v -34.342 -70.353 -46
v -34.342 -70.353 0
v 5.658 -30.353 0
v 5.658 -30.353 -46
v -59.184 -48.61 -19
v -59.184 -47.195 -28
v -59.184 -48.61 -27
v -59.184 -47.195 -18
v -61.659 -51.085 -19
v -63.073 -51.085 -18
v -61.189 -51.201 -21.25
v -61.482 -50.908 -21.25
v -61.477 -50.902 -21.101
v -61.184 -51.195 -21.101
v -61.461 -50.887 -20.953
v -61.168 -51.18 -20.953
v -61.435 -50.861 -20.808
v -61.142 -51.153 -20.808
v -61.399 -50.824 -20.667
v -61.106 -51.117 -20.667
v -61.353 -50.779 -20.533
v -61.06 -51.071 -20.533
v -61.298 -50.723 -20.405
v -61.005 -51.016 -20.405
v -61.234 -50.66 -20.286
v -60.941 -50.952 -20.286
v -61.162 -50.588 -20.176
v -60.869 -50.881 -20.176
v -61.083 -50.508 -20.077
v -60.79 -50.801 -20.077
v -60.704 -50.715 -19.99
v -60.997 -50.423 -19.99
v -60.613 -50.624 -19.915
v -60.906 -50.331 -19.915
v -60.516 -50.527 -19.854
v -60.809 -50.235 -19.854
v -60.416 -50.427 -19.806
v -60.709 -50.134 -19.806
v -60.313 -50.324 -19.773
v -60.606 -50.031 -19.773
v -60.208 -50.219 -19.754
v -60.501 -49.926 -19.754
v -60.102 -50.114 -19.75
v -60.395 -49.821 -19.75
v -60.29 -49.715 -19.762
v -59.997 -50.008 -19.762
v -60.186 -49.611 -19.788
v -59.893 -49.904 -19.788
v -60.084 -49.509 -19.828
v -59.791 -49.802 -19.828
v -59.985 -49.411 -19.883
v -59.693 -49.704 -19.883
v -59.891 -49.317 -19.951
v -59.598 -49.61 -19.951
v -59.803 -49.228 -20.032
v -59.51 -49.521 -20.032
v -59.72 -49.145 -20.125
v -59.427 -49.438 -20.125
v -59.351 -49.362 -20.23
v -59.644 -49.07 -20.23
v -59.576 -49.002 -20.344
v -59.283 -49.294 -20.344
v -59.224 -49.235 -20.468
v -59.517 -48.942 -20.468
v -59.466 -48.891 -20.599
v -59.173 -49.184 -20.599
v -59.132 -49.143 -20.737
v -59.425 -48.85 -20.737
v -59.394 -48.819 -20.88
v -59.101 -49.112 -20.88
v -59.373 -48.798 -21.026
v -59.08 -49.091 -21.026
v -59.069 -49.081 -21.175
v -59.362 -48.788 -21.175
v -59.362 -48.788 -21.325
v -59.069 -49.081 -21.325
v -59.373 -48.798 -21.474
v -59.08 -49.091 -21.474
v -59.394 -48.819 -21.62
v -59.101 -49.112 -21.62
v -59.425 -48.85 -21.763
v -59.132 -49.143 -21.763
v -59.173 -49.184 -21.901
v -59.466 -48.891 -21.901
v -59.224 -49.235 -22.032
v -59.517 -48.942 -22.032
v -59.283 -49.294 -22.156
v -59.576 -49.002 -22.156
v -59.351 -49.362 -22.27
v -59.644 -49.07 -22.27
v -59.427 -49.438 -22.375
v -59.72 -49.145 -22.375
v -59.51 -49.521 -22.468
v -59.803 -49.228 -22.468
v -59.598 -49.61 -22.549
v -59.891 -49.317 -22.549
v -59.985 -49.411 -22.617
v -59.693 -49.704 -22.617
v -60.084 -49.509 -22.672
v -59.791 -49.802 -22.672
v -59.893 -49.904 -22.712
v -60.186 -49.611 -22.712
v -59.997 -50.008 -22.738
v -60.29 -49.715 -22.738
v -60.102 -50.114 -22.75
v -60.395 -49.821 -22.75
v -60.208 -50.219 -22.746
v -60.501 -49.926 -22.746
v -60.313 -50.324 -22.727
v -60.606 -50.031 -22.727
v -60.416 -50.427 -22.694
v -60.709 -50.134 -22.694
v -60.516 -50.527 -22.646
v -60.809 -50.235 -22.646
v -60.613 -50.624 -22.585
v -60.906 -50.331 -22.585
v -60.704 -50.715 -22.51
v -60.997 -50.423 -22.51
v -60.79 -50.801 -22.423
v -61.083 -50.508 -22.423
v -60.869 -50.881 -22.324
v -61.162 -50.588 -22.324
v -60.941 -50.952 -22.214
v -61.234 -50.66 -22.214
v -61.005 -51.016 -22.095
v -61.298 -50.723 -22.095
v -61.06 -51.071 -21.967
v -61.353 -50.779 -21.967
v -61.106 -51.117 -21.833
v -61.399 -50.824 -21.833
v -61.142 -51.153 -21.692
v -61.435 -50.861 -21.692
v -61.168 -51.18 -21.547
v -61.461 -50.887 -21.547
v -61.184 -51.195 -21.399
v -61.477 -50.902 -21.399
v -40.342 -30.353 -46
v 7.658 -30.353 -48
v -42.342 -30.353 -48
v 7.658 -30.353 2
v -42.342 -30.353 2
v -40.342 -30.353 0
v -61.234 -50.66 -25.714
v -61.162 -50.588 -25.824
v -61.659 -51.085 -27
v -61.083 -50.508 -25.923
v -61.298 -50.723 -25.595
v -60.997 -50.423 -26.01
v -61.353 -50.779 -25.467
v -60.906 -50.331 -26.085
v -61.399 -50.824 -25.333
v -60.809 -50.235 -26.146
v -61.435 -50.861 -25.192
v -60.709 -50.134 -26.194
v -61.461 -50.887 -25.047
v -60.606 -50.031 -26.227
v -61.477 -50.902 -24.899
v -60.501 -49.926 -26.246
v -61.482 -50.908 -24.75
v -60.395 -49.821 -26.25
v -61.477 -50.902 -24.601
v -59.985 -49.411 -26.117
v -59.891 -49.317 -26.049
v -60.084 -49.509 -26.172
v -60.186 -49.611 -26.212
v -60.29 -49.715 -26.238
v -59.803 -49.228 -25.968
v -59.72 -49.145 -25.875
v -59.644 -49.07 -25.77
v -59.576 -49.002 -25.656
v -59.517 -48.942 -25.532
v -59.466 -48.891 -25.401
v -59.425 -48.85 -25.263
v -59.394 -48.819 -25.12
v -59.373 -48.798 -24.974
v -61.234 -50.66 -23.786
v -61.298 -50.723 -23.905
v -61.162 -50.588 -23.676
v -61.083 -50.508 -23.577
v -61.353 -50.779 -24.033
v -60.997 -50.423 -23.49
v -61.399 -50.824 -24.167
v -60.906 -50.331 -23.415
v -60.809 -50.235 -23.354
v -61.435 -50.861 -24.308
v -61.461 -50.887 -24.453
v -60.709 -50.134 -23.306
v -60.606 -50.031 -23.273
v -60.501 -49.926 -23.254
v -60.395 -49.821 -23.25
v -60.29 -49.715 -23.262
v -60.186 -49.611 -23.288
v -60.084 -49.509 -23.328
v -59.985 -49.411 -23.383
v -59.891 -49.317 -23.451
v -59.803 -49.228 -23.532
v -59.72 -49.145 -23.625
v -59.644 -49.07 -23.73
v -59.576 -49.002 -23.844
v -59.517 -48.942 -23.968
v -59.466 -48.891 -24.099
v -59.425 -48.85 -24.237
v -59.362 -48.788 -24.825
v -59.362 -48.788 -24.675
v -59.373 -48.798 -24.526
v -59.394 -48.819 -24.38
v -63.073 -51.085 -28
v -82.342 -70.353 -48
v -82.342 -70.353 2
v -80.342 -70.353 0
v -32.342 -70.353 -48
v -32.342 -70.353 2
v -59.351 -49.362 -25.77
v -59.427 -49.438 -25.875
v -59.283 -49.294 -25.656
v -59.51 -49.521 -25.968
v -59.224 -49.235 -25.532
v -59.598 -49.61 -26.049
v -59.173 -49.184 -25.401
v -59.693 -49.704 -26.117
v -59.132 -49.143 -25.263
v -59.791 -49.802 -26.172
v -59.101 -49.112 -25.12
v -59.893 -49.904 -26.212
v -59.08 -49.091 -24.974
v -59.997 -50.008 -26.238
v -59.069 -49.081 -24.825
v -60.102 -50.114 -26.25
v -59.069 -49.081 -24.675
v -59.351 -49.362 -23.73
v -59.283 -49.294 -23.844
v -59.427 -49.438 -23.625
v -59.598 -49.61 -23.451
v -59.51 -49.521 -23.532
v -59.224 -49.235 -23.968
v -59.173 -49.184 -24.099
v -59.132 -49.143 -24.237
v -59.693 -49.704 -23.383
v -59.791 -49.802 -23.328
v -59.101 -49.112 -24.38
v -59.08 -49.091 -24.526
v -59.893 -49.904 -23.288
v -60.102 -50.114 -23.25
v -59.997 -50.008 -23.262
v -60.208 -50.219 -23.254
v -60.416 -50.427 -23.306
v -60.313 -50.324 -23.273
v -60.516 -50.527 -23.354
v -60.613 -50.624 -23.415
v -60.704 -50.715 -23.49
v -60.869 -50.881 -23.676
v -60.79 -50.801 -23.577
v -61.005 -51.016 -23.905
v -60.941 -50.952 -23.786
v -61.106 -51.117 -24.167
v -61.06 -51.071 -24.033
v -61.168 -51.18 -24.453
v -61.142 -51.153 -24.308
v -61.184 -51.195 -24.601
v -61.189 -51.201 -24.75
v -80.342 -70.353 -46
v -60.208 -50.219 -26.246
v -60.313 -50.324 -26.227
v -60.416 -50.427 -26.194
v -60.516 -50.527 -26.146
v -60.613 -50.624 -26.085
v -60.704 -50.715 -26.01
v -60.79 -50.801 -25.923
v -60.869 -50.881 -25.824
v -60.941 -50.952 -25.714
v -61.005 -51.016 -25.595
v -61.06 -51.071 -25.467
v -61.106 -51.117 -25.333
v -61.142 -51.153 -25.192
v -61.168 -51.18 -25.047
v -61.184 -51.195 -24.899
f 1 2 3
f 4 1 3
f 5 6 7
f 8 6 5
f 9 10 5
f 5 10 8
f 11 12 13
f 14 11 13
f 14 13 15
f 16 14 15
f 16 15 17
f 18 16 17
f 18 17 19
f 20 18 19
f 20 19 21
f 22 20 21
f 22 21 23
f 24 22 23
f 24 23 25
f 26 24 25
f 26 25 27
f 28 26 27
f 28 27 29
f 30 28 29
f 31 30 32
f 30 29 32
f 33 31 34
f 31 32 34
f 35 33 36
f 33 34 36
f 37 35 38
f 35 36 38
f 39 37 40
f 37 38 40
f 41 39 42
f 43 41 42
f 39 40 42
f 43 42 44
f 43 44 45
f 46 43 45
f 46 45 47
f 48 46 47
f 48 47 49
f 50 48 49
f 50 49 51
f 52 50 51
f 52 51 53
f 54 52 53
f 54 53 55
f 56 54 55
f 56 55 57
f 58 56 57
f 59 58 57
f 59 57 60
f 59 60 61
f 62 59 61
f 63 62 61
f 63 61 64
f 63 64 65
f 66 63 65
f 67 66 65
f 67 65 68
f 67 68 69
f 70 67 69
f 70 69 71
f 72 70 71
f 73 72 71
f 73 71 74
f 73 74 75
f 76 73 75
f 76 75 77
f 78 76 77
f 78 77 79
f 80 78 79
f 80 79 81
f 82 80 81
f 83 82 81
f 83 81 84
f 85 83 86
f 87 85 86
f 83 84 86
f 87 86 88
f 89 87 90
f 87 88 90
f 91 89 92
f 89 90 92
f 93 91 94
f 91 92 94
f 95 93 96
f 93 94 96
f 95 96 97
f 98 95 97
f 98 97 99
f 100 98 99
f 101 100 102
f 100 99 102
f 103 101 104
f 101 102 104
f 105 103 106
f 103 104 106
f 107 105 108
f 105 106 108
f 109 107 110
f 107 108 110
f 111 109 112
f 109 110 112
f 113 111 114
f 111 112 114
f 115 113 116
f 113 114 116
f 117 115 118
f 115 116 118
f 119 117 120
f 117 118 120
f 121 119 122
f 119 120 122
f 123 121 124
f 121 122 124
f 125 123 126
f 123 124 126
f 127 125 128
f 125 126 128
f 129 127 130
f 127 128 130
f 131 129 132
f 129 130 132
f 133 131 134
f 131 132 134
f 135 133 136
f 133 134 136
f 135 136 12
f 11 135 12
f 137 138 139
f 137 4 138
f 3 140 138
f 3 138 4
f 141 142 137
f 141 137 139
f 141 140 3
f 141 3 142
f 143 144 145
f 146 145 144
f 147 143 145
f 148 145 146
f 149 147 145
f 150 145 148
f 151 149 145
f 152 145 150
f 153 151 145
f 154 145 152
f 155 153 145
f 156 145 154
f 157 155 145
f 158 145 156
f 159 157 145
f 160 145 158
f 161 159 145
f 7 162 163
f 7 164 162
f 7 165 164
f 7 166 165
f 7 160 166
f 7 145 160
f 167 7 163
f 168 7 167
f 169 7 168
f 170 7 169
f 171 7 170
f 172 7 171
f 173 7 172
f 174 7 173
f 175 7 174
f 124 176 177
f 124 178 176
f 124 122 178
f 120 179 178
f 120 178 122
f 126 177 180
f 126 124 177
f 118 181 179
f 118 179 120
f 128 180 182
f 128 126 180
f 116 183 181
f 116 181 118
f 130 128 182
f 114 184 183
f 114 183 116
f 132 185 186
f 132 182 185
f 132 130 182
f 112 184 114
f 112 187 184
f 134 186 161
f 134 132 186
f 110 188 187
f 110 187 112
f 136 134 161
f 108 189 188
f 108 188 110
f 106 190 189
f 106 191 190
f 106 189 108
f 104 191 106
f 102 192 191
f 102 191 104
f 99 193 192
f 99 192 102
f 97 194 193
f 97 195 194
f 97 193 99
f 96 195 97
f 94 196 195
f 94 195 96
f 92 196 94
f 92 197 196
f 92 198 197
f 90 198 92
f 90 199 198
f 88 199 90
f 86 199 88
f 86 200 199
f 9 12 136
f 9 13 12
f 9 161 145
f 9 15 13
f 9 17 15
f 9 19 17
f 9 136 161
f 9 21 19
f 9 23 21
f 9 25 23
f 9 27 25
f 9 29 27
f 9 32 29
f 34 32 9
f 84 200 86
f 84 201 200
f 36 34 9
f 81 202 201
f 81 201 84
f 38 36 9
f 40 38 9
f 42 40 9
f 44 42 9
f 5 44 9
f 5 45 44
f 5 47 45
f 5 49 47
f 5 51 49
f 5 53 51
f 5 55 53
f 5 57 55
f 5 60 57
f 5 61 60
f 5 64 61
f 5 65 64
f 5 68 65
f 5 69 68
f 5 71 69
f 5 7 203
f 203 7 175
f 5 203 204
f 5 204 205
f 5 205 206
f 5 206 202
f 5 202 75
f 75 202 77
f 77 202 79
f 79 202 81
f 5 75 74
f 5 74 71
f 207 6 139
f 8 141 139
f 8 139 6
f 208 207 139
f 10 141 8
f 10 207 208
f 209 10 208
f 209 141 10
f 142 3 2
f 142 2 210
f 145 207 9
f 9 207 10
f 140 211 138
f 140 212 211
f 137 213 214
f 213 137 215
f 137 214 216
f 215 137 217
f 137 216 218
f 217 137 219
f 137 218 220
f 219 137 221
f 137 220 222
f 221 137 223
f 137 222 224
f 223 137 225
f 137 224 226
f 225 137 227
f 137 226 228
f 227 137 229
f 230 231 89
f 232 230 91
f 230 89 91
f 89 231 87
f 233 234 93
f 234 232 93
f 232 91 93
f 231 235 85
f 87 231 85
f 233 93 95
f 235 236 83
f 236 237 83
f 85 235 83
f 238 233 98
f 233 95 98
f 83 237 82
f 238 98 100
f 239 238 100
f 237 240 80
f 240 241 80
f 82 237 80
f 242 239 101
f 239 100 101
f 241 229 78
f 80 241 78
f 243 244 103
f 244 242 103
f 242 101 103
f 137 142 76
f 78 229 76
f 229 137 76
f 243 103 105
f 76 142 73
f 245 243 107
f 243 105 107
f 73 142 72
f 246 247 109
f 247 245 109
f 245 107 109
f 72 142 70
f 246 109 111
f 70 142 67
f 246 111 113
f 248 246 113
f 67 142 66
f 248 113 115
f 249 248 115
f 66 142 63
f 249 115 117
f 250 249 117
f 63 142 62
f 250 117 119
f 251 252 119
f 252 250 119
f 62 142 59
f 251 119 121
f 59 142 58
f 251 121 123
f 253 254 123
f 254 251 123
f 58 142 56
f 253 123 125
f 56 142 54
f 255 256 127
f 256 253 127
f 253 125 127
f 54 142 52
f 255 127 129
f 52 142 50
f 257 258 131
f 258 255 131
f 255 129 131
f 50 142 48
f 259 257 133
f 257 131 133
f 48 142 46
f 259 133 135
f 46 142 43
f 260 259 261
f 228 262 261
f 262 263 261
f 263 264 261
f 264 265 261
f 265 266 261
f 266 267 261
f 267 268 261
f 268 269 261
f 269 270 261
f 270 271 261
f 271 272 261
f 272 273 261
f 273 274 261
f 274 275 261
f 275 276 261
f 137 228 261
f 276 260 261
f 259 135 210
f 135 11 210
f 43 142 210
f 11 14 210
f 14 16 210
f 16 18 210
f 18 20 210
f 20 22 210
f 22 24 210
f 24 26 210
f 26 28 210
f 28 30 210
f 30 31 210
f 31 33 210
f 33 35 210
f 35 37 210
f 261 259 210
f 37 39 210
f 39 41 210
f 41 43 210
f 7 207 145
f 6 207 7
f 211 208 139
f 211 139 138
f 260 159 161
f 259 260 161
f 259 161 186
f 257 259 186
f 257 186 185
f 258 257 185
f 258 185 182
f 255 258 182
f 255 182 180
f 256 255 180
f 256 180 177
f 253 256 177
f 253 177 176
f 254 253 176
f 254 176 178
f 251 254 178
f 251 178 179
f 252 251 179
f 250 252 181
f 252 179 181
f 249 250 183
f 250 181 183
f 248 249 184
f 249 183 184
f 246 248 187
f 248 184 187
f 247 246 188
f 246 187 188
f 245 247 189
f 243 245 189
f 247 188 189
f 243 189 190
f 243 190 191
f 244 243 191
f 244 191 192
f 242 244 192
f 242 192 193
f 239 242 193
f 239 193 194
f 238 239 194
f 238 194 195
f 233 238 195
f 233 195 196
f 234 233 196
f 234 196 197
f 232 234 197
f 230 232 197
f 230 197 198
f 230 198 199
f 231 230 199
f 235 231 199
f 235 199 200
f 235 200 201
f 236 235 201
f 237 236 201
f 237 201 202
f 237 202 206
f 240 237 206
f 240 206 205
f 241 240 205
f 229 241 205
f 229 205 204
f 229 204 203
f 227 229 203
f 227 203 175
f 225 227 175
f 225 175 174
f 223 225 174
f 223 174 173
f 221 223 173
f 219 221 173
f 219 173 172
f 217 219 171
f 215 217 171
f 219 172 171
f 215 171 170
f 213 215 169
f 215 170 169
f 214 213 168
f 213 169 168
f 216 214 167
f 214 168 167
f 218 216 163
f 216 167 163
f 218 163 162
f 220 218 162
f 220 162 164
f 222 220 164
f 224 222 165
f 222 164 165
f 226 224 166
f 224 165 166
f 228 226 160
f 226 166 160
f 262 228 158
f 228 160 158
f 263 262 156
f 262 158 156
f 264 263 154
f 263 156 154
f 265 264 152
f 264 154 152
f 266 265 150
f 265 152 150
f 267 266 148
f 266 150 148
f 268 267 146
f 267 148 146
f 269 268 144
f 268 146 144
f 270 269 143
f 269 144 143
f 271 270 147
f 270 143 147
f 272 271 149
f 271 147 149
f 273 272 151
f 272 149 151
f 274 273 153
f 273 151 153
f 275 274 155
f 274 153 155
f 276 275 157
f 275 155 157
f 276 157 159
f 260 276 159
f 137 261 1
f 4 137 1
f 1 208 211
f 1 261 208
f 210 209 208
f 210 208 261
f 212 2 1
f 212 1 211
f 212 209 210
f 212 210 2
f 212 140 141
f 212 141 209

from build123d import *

# Parameters (mm, degrees)
SALIENTE_EXTRUIR1_DEPTH = 2
SALIENTE_EXTRUIR2_DEPTH = 46
SALIENTE_EXTRUIR3_DEPTH = 2
CROQUIS5_R              = 1.5
CORTAR_EXTRUIR1_DEPTH   = 1.414213562
CROQUIS8_W              = 10
CROQUIS8_H              = 5.5
CORTAR_EXTRUIR2_DEPTH   = 1
CORTAR_EXTRUIR2_DRAFT   = -45


with BuildPart() as part:
    # Croquis2 → Saliente-Extruir1 (new body)
    with BuildSketch(Plane.XY):
        Polygon((-42.342007435, -30.353159851), (7.657992565, -30.353159851), (-32.342007435, -70.353159851), (-82.342007435, -70.353159851), align=None)
    extrude(amount=SALIENTE_EXTRUIR1_DEPTH)

    # Croquis3 → Saliente-Extruir2 (add)
    with BuildSketch(Plane(origin=(0, 0, 0), x_dir=(-1, 0, 0), z_dir=(0, 0, -1))):
        Polygon((-5.657992565, -30.353159851), (-7.657992565, -30.353159851), (32.342007435, -70.353159851), (34.342007435, -70.353159851), align=None)
        Polygon((42.342007435, -30.353159851), (40.342007435, -30.353159851), (80.342007435, -70.353159851), (82.342007435, -70.353159851), align=None)
    extrude(amount=SALIENTE_EXTRUIR2_DEPTH)

    # Croquis4 → Saliente-Extruir3 (add)
    with BuildSketch(Plane(origin=(0, 0, -46), x_dir=(-1, 0, 0), z_dir=(0, 0, -1))):
        Polygon((-7.657992565, -30.353159851), (42.342007435, -30.353159851), (82.342007435, -70.353159851), (32.342007435, -70.353159851), align=None)
    extrude(amount=SALIENTE_EXTRUIR3_DEPTH)

    # Croquis5 → Cortar-Extruir1 (cut)
    with BuildSketch(Plane(origin=(-5.994423792, 5.994423792, 0), x_dir=(0, 0, 1), z_dir=(-0.7071067811865438, 0.7071067811865513, 0))):
        with Locations(Location((-24.75, -77.971788243, 0), (0, 0, 270))):
            Circle(CROQUIS5_R)
        with Locations(Location((-21.25, -77.971788243, 0), (0, 0, 270))):
            Circle(CROQUIS5_R)
    extrude(amount=-CORTAR_EXTRUIR1_DEPTH, mode=Mode.SUBTRACT)


with BuildPart() as cortar_extruir2_tool:
    # Croquis8 → Cortar-Extruir2 (with draft: the straight prism first)
    with BuildSketch(Plane(origin=(-5.994423792, 5.994423792, 0), x_dir=(0, 0, 1), z_dir=(-0.7071067811865438, 0.7071067811865513, 0))):
        with Locations((-23, -77.971788243)):
            Rectangle(CROQUIS8_W, CROQUIS8_H)
    extrude(amount=-CORTAR_EXTRUIR2_DEPTH)
    # Cortar-Extruir2: the draft: its side faces are tilted about the plane it starts from
    cortar_extruir2_sides = [cortar_extruir2_tool.faces().sort_by_distance(p)[0] for p in [
        (-62.719794257, -51.438053455, -23),
        (-60.775250609, -49.493509806, -18),
        (-58.83070696, -47.548966158, -23),
        (-60.775250609, -49.493509806, -28),
    ]]
    draft(cortar_extruir2_sides, Plane(origin=(-5.994423792, 5.994423792, 0), x_dir=(0, 0, 1), z_dir=(-0.7071067811865438, 0.7071067811865513, 0)), CORTAR_EXTRUIR2_DRAFT)


with BuildPart() as part_1:
    add(part.part)

    # Cortar-Extruir2: cut by cortar_extruir2_tool
    add(cortar_extruir2_tool.part, mode=Mode.SUBTRACT)


solid = part_1.part
